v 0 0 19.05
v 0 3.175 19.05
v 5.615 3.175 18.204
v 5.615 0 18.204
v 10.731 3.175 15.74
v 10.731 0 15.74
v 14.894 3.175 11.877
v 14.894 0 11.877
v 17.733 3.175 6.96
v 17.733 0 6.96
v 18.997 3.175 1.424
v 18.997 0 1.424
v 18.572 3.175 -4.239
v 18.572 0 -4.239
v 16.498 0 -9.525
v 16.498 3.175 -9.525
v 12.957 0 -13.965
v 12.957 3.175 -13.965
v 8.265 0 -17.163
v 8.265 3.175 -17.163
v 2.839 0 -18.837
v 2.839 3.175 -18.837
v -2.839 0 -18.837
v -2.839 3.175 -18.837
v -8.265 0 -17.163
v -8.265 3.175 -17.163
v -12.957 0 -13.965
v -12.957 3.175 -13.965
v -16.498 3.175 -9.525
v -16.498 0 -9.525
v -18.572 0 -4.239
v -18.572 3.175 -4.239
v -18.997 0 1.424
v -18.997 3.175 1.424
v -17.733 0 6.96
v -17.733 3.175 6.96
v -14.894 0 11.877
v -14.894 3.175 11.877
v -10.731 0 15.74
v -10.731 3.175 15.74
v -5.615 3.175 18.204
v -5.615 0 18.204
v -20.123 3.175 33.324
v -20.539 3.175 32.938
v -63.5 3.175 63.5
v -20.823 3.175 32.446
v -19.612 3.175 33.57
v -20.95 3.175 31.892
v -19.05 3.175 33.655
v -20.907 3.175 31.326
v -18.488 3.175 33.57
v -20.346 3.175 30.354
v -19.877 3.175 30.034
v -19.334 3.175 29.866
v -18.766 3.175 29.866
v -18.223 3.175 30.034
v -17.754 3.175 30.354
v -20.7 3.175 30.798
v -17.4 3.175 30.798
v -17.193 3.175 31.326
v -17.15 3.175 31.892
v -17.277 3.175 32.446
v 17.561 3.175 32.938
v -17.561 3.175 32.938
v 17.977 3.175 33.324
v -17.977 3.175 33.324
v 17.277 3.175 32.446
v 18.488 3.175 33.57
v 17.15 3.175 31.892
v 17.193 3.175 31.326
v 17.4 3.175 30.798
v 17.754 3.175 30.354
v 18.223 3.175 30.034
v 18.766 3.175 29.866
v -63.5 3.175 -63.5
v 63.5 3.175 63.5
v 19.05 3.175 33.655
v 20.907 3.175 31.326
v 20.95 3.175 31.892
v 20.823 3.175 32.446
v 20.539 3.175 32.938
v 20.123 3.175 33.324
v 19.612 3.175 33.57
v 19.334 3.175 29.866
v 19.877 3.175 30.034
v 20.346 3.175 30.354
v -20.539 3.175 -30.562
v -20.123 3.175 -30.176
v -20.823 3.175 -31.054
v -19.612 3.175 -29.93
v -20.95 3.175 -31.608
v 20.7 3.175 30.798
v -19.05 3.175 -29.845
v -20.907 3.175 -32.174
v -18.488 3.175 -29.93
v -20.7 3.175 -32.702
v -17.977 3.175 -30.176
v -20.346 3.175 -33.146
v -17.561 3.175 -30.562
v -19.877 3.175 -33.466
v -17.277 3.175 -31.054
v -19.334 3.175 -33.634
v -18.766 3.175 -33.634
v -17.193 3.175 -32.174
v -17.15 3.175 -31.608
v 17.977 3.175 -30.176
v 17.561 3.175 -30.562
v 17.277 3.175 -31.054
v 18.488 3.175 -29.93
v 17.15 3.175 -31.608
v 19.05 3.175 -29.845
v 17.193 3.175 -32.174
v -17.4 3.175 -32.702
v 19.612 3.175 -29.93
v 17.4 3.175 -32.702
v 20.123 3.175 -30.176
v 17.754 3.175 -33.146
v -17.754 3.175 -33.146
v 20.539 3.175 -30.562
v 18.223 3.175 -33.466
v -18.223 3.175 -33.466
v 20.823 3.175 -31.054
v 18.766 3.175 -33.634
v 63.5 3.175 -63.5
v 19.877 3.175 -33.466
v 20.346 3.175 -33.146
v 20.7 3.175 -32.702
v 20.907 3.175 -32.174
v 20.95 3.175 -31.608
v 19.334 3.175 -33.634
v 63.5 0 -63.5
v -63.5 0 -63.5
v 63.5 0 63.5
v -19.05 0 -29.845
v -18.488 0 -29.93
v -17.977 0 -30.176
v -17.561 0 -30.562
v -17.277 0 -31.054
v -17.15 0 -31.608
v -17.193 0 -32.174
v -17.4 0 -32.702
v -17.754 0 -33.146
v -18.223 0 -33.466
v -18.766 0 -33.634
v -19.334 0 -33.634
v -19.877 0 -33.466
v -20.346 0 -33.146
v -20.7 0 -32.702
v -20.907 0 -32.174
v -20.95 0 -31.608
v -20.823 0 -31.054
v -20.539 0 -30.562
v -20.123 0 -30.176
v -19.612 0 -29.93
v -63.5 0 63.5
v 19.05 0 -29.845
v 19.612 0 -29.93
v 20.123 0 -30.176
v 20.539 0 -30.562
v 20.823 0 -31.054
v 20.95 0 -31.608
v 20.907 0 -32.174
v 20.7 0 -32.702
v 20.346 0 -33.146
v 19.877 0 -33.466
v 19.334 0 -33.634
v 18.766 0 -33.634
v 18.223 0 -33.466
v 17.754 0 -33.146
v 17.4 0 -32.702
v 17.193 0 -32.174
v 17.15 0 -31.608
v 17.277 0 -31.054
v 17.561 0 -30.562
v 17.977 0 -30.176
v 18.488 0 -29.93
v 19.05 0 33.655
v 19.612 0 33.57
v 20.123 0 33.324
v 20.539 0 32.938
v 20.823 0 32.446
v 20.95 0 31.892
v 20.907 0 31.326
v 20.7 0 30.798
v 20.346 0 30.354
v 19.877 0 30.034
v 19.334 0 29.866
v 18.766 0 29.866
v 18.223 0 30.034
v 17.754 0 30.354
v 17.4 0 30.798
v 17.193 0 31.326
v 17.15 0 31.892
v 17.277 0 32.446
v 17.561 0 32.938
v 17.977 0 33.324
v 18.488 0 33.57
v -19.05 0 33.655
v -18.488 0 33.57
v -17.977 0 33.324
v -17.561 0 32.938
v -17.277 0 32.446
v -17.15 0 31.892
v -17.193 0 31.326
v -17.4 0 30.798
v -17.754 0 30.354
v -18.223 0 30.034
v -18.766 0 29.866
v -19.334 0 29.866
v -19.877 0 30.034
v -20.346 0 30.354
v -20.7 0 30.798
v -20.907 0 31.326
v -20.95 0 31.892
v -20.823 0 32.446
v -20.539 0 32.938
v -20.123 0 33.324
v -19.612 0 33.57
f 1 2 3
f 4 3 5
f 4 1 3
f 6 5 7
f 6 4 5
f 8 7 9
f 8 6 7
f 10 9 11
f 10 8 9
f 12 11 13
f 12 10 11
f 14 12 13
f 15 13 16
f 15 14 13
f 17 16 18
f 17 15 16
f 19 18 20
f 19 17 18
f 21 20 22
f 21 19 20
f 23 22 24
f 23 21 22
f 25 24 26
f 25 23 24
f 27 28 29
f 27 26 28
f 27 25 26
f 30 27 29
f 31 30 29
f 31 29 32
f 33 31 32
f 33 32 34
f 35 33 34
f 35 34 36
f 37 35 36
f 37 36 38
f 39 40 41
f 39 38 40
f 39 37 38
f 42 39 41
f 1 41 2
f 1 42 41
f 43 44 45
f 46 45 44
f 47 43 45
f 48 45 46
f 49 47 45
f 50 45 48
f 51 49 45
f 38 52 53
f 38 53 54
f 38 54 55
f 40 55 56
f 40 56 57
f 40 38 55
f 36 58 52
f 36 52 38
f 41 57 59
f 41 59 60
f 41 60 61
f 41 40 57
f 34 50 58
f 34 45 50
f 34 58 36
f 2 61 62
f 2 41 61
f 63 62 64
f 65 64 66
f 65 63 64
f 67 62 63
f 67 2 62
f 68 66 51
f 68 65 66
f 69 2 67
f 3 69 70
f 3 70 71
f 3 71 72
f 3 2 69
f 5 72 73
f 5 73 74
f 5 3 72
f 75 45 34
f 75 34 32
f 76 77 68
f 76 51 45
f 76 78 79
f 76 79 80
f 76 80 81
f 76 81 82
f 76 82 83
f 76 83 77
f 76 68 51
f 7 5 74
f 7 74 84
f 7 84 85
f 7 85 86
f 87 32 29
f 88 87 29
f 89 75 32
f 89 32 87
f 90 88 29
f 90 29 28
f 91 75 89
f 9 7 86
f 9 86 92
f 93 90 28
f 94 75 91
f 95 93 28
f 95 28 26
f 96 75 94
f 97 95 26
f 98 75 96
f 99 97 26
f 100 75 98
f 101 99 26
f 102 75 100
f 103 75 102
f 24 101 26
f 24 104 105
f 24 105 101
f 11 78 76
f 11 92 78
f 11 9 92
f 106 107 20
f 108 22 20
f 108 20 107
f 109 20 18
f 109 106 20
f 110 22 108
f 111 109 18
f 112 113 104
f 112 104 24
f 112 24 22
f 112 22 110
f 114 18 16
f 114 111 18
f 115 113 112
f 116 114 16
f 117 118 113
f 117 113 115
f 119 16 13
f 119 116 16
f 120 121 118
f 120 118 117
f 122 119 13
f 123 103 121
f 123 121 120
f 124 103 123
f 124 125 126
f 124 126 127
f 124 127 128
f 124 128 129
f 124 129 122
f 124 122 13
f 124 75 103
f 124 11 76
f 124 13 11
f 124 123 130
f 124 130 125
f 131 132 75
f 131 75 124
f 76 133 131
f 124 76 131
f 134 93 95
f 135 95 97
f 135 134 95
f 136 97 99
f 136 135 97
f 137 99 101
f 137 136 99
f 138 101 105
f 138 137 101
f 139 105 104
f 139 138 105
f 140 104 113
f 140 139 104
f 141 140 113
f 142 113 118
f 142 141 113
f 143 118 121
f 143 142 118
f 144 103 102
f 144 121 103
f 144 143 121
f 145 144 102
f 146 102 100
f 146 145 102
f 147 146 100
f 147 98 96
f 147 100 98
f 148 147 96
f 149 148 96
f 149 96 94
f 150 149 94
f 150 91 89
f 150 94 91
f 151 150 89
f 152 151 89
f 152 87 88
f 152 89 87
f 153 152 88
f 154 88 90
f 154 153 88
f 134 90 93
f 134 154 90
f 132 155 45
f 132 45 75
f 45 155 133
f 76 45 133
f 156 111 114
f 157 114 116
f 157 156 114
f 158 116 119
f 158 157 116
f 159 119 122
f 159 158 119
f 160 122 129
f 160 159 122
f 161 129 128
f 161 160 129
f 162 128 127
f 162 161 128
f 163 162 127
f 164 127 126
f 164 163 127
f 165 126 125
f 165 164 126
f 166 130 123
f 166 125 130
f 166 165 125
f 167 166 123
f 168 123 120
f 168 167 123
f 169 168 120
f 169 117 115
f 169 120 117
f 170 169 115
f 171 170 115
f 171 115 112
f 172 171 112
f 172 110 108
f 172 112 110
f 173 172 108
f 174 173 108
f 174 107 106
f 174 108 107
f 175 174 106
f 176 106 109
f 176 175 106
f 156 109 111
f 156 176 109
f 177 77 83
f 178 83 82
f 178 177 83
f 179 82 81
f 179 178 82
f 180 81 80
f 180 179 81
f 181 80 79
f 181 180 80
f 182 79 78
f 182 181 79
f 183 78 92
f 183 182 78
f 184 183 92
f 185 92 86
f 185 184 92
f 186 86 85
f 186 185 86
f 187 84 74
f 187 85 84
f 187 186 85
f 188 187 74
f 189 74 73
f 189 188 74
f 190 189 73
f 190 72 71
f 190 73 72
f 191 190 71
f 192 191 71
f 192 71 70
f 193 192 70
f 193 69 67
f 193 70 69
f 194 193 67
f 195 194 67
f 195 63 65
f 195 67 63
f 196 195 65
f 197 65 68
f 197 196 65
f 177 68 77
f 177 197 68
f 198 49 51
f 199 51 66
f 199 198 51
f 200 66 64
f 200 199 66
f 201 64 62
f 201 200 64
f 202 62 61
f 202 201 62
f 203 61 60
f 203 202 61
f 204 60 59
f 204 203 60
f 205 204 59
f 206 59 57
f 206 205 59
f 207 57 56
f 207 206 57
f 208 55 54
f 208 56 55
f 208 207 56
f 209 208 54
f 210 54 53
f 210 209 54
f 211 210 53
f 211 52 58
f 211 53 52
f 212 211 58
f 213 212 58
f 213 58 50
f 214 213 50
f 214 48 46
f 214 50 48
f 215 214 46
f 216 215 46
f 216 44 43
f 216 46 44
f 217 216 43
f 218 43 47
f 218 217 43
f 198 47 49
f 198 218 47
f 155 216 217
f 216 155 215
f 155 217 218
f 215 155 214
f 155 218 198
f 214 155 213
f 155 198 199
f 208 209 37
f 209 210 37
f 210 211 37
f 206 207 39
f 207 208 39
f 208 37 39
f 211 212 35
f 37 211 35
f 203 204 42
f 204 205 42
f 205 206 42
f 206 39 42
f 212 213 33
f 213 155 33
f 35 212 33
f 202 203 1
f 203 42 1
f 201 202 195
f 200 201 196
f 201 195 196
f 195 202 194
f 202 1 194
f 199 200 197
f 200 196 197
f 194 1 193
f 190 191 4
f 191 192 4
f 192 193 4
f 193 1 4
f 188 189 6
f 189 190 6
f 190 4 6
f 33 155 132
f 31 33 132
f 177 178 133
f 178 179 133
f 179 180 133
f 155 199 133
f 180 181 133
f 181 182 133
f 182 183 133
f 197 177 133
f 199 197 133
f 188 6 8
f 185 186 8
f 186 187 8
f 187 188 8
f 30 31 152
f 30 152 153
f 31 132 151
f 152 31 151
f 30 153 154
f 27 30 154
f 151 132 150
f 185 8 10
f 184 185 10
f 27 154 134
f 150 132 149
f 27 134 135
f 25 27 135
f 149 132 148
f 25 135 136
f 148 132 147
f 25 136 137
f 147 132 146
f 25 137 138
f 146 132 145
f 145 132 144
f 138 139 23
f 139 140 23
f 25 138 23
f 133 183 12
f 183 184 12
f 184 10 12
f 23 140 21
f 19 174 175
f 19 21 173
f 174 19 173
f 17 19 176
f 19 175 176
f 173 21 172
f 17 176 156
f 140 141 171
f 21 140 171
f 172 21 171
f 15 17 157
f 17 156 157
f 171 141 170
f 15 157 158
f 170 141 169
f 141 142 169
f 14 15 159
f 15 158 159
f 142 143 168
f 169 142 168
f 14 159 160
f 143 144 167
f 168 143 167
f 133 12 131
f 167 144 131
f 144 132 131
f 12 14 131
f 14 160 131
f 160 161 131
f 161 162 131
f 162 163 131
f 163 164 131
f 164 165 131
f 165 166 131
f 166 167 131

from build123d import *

# Parameters (mm, degrees)
SKETCH1_W           = 127
SKETCH1_H           = 127
BOSS_EXTRUDE1_DEPTH = 3.175
SKETCH2_R           = 19.05
SKETCH2_R_2         = 1.905
CUT_EXTRUDE1_DEPTH  = 90.858670283


with BuildPart() as part:
    # Sketch1 → Boss-Extrude1 (new body)
    with BuildSketch(Plane(origin=(0, 0, 0), x_dir=(1, 0, 0), z_dir=(0, 1, 0))):
        Rectangle(SKETCH1_W, SKETCH1_H)
    extrude(amount=BOSS_EXTRUDE1_DEPTH)

    # Sketch2 → Cut-Extrude1 (cut, through all)
    with BuildSketch(Plane(origin=(0, 0, 0), x_dir=(1, 0, 0), z_dir=(0, 1, 0))):
        with Locations(Location((0, 0, 0), (0, 0, 270))):
            Circle(SKETCH2_R)
        with Locations(Location((19.05, 31.75, 0), (0, 0, 270))):
            Circle(SKETCH2_R_2)
        with Locations(Location((-19.05, 31.75, 0), (0, 0, 270))):
            Circle(SKETCH2_R_2)
        with Locations(Location((-19.05, -31.75, 0), (0, 0, 270))):
            Circle(SKETCH2_R_2)
        with Locations(Location((19.05, -31.75, 0), (0, 0, 270))):
            Circle(SKETCH2_R_2)
    extrude(amount=CUT_EXTRUDE1_DEPTH, mode=Mode.SUBTRACT)


solid = part.part
